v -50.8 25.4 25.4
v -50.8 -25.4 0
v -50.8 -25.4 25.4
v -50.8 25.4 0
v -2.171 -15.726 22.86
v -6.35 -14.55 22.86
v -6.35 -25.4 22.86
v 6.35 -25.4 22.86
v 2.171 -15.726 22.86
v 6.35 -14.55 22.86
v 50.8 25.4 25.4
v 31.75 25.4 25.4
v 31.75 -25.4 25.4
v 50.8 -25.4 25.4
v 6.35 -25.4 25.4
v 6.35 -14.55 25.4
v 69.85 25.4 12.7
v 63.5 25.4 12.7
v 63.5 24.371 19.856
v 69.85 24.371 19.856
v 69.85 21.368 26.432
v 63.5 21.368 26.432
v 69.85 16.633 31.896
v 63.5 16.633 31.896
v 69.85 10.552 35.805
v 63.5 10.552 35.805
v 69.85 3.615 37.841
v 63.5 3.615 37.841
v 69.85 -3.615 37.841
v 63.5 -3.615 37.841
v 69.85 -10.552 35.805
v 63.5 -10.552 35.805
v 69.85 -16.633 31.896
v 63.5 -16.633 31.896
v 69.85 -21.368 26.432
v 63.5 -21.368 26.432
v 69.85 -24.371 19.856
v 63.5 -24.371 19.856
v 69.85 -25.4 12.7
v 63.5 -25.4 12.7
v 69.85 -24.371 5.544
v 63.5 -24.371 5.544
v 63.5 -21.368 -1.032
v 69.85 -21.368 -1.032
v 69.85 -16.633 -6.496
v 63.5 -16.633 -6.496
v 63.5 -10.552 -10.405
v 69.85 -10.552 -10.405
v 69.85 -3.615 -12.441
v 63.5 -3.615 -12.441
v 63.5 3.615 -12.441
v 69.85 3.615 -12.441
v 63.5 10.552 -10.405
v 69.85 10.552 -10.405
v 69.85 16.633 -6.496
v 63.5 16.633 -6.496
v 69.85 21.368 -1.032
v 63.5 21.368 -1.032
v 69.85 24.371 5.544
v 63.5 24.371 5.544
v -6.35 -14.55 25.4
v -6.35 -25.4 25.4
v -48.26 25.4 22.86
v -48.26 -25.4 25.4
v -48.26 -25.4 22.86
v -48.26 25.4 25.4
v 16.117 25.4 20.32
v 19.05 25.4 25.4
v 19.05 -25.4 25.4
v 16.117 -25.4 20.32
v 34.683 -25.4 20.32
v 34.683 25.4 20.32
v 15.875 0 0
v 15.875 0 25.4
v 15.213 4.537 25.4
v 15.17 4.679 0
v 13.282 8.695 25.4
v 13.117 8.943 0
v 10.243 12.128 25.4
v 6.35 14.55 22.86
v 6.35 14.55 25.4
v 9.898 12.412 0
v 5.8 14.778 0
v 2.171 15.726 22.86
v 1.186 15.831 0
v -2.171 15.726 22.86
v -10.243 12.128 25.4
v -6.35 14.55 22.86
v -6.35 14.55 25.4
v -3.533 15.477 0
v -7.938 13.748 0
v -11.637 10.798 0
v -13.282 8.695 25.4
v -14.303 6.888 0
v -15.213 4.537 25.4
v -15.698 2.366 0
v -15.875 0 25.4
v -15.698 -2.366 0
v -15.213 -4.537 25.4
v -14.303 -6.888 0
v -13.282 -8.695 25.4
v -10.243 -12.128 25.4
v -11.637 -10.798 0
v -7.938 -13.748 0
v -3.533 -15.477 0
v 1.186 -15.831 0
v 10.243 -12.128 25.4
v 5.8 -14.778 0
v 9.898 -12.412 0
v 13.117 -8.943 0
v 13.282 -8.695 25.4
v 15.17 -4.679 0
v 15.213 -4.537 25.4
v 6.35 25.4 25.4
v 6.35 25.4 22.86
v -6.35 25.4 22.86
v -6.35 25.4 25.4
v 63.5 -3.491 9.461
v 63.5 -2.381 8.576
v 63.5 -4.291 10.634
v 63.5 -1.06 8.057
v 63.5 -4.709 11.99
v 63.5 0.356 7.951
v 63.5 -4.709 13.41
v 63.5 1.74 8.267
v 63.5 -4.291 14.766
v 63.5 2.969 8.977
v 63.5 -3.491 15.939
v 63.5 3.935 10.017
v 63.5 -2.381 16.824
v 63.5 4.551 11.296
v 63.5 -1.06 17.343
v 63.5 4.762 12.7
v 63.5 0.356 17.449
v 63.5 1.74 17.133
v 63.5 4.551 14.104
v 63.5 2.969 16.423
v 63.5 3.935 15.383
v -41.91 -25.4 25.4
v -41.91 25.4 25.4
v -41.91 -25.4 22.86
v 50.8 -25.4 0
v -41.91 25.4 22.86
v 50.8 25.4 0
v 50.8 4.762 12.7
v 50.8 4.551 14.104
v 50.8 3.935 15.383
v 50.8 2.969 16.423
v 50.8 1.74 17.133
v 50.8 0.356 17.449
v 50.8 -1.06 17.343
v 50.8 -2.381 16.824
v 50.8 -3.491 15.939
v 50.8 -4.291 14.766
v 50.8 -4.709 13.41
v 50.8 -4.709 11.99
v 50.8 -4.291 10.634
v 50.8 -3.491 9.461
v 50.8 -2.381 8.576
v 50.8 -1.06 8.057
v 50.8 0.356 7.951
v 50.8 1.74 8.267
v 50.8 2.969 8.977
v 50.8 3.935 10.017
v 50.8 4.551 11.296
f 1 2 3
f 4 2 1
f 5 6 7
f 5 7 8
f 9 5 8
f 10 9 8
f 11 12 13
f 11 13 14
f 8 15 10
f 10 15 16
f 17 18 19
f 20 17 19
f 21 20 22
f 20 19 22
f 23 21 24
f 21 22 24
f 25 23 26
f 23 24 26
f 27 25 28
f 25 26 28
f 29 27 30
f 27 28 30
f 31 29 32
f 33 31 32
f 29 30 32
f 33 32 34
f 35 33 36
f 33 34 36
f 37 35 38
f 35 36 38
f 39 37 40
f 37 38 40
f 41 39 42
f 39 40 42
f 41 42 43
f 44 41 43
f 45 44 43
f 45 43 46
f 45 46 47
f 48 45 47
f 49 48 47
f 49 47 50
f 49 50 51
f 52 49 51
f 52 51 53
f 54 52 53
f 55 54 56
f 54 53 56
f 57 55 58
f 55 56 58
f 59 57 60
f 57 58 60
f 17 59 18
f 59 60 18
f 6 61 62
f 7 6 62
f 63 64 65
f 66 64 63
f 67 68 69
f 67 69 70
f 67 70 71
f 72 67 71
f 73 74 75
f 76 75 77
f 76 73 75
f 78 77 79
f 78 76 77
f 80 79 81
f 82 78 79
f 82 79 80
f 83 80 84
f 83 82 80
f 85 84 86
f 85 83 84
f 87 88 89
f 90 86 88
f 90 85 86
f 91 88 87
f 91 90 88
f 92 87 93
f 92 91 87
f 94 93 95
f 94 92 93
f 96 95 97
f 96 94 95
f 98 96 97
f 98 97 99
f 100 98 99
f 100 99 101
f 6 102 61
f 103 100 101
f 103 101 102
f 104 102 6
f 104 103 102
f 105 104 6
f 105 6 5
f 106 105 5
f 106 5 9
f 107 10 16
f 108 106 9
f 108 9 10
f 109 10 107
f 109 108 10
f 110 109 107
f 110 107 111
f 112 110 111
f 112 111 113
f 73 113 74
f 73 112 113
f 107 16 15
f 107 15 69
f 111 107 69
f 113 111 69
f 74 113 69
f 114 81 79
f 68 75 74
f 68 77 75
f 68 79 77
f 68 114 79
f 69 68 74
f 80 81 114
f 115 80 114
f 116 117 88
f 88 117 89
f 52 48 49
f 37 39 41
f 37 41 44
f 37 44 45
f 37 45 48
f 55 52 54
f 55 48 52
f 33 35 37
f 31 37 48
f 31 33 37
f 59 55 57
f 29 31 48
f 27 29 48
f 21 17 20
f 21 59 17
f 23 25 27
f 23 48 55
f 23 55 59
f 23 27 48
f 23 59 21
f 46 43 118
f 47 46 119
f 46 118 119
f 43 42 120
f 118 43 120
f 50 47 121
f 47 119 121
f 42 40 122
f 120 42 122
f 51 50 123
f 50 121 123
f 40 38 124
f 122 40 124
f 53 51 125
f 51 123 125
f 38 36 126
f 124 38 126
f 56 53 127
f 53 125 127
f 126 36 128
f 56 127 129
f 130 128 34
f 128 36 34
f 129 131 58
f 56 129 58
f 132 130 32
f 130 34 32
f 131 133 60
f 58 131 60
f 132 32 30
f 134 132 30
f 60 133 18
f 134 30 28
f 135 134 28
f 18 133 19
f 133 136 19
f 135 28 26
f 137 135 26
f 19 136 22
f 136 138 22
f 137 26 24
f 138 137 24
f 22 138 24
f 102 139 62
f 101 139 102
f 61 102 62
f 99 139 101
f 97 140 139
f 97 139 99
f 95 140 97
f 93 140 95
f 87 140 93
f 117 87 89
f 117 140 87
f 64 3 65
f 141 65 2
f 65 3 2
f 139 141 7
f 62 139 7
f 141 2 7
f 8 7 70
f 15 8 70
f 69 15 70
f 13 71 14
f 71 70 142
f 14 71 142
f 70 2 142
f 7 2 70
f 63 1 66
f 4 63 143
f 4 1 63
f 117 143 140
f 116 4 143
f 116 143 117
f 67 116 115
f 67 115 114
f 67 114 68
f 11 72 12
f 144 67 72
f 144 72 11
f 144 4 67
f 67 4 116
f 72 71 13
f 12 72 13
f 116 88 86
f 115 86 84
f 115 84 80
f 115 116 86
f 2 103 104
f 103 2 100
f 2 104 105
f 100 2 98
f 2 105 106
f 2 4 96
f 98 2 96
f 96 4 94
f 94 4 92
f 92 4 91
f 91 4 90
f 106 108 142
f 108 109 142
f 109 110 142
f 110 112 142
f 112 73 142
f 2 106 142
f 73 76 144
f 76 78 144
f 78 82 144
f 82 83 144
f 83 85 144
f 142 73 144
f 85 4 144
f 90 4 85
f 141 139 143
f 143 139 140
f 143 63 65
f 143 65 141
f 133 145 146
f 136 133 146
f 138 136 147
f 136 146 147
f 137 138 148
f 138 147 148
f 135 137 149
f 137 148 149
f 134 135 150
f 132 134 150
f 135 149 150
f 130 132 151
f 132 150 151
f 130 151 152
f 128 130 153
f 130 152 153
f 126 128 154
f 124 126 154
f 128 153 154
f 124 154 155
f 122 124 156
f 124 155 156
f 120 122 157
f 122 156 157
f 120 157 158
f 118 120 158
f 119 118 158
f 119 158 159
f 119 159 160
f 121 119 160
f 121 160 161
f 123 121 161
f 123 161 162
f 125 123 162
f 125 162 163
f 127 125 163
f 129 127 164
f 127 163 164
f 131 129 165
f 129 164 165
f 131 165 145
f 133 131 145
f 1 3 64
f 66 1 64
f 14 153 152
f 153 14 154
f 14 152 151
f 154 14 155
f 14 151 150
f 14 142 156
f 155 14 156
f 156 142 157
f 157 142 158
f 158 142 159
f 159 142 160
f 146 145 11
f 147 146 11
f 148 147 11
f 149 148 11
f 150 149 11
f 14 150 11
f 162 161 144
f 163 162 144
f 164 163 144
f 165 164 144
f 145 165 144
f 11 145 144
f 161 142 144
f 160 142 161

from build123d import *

# Parameters (mm, degrees)
F0_W     = 101.6
F0_H     = 50.8
F0_R     = 15.875
F1_DEPTH = 25.4
F2_W     = 6.35
F2_H     = 50.8
F3_DEPTH = 2.54
F5_DEPTH = 50.801
F6_R     = 4.7625
F7_DEPTH = 12.7
F8_R     = 25.4
F8_R_2   = 4.7625
F9_DEPTH = 6.35


with BuildPart() as f1:
    # F0 (on Top) → F1 (new body)
    with BuildSketch(Plane.XY):
        Rectangle(F0_W, F0_H)
        Circle(F0_R, mode=Mode.SUBTRACT)
    extrude(amount=F1_DEPTH)

    # F2 (on face) → F3 (cut)
    with BuildSketch(Plane.XY.offset(25.4)):
        with BuildLine():
            Line((6.35, 25.4), (-6.35, 25.4))
            Line((-6.35, 25.4), (-6.35, 14.5496778315))
            ThreePointArc((-6.35, 14.5496778315), (0, 15.875), (6.35, 14.5496778315))
            Line((6.35, 14.5496778315), (6.35, 25.4))
        make_face()
        with BuildLine():
            Line((-6.35, -14.5496778315), (-6.35, -25.4))
            Line((-6.35, -25.4), (6.35, -25.4))
            Line((6.35, -25.4), (6.35, -14.5496778315))
            ThreePointArc((6.35, -14.5496778315), (0, -15.875), (-6.35, -14.5496778315))
        make_face()
        with Locations((-45.085, 0)):
            Rectangle(F2_W, F2_H)
    extrude(amount=-F3_DEPTH, mode=Mode.SUBTRACT)

    # F4 (on face) → F5 (cut, through all)
    with BuildSketch(Plane.XZ.offset(25.4)):
        Polygon((31.75, 25.4), (19.05, 25.4), (16.1170606325, 20.32), (34.6829393675, 20.32), align=None)
    extrude(amount=-F5_DEPTH, mode=Mode.SUBTRACT)

    # F6 (on face) → F7 (join)
    with BuildSketch(Plane.YZ.offset(50.8)):
        with Locations((0, 12.7)):
            Circle(F6_R)
    extrude(amount=F7_DEPTH)

    # F8 (on face) → F9 (join)
    with BuildSketch(Plane.YZ.offset(63.5)):
        with Locations((0, 12.7)):
            Circle(F8_R)
        with Locations((0, 12.7)):
            Circle(F8_R_2, mode=Mode.SUBTRACT)
        with Locations((0, 12.7)):
            Circle(F8_R_2)
    extrude(amount=F9_DEPTH)


solid = f1.part
